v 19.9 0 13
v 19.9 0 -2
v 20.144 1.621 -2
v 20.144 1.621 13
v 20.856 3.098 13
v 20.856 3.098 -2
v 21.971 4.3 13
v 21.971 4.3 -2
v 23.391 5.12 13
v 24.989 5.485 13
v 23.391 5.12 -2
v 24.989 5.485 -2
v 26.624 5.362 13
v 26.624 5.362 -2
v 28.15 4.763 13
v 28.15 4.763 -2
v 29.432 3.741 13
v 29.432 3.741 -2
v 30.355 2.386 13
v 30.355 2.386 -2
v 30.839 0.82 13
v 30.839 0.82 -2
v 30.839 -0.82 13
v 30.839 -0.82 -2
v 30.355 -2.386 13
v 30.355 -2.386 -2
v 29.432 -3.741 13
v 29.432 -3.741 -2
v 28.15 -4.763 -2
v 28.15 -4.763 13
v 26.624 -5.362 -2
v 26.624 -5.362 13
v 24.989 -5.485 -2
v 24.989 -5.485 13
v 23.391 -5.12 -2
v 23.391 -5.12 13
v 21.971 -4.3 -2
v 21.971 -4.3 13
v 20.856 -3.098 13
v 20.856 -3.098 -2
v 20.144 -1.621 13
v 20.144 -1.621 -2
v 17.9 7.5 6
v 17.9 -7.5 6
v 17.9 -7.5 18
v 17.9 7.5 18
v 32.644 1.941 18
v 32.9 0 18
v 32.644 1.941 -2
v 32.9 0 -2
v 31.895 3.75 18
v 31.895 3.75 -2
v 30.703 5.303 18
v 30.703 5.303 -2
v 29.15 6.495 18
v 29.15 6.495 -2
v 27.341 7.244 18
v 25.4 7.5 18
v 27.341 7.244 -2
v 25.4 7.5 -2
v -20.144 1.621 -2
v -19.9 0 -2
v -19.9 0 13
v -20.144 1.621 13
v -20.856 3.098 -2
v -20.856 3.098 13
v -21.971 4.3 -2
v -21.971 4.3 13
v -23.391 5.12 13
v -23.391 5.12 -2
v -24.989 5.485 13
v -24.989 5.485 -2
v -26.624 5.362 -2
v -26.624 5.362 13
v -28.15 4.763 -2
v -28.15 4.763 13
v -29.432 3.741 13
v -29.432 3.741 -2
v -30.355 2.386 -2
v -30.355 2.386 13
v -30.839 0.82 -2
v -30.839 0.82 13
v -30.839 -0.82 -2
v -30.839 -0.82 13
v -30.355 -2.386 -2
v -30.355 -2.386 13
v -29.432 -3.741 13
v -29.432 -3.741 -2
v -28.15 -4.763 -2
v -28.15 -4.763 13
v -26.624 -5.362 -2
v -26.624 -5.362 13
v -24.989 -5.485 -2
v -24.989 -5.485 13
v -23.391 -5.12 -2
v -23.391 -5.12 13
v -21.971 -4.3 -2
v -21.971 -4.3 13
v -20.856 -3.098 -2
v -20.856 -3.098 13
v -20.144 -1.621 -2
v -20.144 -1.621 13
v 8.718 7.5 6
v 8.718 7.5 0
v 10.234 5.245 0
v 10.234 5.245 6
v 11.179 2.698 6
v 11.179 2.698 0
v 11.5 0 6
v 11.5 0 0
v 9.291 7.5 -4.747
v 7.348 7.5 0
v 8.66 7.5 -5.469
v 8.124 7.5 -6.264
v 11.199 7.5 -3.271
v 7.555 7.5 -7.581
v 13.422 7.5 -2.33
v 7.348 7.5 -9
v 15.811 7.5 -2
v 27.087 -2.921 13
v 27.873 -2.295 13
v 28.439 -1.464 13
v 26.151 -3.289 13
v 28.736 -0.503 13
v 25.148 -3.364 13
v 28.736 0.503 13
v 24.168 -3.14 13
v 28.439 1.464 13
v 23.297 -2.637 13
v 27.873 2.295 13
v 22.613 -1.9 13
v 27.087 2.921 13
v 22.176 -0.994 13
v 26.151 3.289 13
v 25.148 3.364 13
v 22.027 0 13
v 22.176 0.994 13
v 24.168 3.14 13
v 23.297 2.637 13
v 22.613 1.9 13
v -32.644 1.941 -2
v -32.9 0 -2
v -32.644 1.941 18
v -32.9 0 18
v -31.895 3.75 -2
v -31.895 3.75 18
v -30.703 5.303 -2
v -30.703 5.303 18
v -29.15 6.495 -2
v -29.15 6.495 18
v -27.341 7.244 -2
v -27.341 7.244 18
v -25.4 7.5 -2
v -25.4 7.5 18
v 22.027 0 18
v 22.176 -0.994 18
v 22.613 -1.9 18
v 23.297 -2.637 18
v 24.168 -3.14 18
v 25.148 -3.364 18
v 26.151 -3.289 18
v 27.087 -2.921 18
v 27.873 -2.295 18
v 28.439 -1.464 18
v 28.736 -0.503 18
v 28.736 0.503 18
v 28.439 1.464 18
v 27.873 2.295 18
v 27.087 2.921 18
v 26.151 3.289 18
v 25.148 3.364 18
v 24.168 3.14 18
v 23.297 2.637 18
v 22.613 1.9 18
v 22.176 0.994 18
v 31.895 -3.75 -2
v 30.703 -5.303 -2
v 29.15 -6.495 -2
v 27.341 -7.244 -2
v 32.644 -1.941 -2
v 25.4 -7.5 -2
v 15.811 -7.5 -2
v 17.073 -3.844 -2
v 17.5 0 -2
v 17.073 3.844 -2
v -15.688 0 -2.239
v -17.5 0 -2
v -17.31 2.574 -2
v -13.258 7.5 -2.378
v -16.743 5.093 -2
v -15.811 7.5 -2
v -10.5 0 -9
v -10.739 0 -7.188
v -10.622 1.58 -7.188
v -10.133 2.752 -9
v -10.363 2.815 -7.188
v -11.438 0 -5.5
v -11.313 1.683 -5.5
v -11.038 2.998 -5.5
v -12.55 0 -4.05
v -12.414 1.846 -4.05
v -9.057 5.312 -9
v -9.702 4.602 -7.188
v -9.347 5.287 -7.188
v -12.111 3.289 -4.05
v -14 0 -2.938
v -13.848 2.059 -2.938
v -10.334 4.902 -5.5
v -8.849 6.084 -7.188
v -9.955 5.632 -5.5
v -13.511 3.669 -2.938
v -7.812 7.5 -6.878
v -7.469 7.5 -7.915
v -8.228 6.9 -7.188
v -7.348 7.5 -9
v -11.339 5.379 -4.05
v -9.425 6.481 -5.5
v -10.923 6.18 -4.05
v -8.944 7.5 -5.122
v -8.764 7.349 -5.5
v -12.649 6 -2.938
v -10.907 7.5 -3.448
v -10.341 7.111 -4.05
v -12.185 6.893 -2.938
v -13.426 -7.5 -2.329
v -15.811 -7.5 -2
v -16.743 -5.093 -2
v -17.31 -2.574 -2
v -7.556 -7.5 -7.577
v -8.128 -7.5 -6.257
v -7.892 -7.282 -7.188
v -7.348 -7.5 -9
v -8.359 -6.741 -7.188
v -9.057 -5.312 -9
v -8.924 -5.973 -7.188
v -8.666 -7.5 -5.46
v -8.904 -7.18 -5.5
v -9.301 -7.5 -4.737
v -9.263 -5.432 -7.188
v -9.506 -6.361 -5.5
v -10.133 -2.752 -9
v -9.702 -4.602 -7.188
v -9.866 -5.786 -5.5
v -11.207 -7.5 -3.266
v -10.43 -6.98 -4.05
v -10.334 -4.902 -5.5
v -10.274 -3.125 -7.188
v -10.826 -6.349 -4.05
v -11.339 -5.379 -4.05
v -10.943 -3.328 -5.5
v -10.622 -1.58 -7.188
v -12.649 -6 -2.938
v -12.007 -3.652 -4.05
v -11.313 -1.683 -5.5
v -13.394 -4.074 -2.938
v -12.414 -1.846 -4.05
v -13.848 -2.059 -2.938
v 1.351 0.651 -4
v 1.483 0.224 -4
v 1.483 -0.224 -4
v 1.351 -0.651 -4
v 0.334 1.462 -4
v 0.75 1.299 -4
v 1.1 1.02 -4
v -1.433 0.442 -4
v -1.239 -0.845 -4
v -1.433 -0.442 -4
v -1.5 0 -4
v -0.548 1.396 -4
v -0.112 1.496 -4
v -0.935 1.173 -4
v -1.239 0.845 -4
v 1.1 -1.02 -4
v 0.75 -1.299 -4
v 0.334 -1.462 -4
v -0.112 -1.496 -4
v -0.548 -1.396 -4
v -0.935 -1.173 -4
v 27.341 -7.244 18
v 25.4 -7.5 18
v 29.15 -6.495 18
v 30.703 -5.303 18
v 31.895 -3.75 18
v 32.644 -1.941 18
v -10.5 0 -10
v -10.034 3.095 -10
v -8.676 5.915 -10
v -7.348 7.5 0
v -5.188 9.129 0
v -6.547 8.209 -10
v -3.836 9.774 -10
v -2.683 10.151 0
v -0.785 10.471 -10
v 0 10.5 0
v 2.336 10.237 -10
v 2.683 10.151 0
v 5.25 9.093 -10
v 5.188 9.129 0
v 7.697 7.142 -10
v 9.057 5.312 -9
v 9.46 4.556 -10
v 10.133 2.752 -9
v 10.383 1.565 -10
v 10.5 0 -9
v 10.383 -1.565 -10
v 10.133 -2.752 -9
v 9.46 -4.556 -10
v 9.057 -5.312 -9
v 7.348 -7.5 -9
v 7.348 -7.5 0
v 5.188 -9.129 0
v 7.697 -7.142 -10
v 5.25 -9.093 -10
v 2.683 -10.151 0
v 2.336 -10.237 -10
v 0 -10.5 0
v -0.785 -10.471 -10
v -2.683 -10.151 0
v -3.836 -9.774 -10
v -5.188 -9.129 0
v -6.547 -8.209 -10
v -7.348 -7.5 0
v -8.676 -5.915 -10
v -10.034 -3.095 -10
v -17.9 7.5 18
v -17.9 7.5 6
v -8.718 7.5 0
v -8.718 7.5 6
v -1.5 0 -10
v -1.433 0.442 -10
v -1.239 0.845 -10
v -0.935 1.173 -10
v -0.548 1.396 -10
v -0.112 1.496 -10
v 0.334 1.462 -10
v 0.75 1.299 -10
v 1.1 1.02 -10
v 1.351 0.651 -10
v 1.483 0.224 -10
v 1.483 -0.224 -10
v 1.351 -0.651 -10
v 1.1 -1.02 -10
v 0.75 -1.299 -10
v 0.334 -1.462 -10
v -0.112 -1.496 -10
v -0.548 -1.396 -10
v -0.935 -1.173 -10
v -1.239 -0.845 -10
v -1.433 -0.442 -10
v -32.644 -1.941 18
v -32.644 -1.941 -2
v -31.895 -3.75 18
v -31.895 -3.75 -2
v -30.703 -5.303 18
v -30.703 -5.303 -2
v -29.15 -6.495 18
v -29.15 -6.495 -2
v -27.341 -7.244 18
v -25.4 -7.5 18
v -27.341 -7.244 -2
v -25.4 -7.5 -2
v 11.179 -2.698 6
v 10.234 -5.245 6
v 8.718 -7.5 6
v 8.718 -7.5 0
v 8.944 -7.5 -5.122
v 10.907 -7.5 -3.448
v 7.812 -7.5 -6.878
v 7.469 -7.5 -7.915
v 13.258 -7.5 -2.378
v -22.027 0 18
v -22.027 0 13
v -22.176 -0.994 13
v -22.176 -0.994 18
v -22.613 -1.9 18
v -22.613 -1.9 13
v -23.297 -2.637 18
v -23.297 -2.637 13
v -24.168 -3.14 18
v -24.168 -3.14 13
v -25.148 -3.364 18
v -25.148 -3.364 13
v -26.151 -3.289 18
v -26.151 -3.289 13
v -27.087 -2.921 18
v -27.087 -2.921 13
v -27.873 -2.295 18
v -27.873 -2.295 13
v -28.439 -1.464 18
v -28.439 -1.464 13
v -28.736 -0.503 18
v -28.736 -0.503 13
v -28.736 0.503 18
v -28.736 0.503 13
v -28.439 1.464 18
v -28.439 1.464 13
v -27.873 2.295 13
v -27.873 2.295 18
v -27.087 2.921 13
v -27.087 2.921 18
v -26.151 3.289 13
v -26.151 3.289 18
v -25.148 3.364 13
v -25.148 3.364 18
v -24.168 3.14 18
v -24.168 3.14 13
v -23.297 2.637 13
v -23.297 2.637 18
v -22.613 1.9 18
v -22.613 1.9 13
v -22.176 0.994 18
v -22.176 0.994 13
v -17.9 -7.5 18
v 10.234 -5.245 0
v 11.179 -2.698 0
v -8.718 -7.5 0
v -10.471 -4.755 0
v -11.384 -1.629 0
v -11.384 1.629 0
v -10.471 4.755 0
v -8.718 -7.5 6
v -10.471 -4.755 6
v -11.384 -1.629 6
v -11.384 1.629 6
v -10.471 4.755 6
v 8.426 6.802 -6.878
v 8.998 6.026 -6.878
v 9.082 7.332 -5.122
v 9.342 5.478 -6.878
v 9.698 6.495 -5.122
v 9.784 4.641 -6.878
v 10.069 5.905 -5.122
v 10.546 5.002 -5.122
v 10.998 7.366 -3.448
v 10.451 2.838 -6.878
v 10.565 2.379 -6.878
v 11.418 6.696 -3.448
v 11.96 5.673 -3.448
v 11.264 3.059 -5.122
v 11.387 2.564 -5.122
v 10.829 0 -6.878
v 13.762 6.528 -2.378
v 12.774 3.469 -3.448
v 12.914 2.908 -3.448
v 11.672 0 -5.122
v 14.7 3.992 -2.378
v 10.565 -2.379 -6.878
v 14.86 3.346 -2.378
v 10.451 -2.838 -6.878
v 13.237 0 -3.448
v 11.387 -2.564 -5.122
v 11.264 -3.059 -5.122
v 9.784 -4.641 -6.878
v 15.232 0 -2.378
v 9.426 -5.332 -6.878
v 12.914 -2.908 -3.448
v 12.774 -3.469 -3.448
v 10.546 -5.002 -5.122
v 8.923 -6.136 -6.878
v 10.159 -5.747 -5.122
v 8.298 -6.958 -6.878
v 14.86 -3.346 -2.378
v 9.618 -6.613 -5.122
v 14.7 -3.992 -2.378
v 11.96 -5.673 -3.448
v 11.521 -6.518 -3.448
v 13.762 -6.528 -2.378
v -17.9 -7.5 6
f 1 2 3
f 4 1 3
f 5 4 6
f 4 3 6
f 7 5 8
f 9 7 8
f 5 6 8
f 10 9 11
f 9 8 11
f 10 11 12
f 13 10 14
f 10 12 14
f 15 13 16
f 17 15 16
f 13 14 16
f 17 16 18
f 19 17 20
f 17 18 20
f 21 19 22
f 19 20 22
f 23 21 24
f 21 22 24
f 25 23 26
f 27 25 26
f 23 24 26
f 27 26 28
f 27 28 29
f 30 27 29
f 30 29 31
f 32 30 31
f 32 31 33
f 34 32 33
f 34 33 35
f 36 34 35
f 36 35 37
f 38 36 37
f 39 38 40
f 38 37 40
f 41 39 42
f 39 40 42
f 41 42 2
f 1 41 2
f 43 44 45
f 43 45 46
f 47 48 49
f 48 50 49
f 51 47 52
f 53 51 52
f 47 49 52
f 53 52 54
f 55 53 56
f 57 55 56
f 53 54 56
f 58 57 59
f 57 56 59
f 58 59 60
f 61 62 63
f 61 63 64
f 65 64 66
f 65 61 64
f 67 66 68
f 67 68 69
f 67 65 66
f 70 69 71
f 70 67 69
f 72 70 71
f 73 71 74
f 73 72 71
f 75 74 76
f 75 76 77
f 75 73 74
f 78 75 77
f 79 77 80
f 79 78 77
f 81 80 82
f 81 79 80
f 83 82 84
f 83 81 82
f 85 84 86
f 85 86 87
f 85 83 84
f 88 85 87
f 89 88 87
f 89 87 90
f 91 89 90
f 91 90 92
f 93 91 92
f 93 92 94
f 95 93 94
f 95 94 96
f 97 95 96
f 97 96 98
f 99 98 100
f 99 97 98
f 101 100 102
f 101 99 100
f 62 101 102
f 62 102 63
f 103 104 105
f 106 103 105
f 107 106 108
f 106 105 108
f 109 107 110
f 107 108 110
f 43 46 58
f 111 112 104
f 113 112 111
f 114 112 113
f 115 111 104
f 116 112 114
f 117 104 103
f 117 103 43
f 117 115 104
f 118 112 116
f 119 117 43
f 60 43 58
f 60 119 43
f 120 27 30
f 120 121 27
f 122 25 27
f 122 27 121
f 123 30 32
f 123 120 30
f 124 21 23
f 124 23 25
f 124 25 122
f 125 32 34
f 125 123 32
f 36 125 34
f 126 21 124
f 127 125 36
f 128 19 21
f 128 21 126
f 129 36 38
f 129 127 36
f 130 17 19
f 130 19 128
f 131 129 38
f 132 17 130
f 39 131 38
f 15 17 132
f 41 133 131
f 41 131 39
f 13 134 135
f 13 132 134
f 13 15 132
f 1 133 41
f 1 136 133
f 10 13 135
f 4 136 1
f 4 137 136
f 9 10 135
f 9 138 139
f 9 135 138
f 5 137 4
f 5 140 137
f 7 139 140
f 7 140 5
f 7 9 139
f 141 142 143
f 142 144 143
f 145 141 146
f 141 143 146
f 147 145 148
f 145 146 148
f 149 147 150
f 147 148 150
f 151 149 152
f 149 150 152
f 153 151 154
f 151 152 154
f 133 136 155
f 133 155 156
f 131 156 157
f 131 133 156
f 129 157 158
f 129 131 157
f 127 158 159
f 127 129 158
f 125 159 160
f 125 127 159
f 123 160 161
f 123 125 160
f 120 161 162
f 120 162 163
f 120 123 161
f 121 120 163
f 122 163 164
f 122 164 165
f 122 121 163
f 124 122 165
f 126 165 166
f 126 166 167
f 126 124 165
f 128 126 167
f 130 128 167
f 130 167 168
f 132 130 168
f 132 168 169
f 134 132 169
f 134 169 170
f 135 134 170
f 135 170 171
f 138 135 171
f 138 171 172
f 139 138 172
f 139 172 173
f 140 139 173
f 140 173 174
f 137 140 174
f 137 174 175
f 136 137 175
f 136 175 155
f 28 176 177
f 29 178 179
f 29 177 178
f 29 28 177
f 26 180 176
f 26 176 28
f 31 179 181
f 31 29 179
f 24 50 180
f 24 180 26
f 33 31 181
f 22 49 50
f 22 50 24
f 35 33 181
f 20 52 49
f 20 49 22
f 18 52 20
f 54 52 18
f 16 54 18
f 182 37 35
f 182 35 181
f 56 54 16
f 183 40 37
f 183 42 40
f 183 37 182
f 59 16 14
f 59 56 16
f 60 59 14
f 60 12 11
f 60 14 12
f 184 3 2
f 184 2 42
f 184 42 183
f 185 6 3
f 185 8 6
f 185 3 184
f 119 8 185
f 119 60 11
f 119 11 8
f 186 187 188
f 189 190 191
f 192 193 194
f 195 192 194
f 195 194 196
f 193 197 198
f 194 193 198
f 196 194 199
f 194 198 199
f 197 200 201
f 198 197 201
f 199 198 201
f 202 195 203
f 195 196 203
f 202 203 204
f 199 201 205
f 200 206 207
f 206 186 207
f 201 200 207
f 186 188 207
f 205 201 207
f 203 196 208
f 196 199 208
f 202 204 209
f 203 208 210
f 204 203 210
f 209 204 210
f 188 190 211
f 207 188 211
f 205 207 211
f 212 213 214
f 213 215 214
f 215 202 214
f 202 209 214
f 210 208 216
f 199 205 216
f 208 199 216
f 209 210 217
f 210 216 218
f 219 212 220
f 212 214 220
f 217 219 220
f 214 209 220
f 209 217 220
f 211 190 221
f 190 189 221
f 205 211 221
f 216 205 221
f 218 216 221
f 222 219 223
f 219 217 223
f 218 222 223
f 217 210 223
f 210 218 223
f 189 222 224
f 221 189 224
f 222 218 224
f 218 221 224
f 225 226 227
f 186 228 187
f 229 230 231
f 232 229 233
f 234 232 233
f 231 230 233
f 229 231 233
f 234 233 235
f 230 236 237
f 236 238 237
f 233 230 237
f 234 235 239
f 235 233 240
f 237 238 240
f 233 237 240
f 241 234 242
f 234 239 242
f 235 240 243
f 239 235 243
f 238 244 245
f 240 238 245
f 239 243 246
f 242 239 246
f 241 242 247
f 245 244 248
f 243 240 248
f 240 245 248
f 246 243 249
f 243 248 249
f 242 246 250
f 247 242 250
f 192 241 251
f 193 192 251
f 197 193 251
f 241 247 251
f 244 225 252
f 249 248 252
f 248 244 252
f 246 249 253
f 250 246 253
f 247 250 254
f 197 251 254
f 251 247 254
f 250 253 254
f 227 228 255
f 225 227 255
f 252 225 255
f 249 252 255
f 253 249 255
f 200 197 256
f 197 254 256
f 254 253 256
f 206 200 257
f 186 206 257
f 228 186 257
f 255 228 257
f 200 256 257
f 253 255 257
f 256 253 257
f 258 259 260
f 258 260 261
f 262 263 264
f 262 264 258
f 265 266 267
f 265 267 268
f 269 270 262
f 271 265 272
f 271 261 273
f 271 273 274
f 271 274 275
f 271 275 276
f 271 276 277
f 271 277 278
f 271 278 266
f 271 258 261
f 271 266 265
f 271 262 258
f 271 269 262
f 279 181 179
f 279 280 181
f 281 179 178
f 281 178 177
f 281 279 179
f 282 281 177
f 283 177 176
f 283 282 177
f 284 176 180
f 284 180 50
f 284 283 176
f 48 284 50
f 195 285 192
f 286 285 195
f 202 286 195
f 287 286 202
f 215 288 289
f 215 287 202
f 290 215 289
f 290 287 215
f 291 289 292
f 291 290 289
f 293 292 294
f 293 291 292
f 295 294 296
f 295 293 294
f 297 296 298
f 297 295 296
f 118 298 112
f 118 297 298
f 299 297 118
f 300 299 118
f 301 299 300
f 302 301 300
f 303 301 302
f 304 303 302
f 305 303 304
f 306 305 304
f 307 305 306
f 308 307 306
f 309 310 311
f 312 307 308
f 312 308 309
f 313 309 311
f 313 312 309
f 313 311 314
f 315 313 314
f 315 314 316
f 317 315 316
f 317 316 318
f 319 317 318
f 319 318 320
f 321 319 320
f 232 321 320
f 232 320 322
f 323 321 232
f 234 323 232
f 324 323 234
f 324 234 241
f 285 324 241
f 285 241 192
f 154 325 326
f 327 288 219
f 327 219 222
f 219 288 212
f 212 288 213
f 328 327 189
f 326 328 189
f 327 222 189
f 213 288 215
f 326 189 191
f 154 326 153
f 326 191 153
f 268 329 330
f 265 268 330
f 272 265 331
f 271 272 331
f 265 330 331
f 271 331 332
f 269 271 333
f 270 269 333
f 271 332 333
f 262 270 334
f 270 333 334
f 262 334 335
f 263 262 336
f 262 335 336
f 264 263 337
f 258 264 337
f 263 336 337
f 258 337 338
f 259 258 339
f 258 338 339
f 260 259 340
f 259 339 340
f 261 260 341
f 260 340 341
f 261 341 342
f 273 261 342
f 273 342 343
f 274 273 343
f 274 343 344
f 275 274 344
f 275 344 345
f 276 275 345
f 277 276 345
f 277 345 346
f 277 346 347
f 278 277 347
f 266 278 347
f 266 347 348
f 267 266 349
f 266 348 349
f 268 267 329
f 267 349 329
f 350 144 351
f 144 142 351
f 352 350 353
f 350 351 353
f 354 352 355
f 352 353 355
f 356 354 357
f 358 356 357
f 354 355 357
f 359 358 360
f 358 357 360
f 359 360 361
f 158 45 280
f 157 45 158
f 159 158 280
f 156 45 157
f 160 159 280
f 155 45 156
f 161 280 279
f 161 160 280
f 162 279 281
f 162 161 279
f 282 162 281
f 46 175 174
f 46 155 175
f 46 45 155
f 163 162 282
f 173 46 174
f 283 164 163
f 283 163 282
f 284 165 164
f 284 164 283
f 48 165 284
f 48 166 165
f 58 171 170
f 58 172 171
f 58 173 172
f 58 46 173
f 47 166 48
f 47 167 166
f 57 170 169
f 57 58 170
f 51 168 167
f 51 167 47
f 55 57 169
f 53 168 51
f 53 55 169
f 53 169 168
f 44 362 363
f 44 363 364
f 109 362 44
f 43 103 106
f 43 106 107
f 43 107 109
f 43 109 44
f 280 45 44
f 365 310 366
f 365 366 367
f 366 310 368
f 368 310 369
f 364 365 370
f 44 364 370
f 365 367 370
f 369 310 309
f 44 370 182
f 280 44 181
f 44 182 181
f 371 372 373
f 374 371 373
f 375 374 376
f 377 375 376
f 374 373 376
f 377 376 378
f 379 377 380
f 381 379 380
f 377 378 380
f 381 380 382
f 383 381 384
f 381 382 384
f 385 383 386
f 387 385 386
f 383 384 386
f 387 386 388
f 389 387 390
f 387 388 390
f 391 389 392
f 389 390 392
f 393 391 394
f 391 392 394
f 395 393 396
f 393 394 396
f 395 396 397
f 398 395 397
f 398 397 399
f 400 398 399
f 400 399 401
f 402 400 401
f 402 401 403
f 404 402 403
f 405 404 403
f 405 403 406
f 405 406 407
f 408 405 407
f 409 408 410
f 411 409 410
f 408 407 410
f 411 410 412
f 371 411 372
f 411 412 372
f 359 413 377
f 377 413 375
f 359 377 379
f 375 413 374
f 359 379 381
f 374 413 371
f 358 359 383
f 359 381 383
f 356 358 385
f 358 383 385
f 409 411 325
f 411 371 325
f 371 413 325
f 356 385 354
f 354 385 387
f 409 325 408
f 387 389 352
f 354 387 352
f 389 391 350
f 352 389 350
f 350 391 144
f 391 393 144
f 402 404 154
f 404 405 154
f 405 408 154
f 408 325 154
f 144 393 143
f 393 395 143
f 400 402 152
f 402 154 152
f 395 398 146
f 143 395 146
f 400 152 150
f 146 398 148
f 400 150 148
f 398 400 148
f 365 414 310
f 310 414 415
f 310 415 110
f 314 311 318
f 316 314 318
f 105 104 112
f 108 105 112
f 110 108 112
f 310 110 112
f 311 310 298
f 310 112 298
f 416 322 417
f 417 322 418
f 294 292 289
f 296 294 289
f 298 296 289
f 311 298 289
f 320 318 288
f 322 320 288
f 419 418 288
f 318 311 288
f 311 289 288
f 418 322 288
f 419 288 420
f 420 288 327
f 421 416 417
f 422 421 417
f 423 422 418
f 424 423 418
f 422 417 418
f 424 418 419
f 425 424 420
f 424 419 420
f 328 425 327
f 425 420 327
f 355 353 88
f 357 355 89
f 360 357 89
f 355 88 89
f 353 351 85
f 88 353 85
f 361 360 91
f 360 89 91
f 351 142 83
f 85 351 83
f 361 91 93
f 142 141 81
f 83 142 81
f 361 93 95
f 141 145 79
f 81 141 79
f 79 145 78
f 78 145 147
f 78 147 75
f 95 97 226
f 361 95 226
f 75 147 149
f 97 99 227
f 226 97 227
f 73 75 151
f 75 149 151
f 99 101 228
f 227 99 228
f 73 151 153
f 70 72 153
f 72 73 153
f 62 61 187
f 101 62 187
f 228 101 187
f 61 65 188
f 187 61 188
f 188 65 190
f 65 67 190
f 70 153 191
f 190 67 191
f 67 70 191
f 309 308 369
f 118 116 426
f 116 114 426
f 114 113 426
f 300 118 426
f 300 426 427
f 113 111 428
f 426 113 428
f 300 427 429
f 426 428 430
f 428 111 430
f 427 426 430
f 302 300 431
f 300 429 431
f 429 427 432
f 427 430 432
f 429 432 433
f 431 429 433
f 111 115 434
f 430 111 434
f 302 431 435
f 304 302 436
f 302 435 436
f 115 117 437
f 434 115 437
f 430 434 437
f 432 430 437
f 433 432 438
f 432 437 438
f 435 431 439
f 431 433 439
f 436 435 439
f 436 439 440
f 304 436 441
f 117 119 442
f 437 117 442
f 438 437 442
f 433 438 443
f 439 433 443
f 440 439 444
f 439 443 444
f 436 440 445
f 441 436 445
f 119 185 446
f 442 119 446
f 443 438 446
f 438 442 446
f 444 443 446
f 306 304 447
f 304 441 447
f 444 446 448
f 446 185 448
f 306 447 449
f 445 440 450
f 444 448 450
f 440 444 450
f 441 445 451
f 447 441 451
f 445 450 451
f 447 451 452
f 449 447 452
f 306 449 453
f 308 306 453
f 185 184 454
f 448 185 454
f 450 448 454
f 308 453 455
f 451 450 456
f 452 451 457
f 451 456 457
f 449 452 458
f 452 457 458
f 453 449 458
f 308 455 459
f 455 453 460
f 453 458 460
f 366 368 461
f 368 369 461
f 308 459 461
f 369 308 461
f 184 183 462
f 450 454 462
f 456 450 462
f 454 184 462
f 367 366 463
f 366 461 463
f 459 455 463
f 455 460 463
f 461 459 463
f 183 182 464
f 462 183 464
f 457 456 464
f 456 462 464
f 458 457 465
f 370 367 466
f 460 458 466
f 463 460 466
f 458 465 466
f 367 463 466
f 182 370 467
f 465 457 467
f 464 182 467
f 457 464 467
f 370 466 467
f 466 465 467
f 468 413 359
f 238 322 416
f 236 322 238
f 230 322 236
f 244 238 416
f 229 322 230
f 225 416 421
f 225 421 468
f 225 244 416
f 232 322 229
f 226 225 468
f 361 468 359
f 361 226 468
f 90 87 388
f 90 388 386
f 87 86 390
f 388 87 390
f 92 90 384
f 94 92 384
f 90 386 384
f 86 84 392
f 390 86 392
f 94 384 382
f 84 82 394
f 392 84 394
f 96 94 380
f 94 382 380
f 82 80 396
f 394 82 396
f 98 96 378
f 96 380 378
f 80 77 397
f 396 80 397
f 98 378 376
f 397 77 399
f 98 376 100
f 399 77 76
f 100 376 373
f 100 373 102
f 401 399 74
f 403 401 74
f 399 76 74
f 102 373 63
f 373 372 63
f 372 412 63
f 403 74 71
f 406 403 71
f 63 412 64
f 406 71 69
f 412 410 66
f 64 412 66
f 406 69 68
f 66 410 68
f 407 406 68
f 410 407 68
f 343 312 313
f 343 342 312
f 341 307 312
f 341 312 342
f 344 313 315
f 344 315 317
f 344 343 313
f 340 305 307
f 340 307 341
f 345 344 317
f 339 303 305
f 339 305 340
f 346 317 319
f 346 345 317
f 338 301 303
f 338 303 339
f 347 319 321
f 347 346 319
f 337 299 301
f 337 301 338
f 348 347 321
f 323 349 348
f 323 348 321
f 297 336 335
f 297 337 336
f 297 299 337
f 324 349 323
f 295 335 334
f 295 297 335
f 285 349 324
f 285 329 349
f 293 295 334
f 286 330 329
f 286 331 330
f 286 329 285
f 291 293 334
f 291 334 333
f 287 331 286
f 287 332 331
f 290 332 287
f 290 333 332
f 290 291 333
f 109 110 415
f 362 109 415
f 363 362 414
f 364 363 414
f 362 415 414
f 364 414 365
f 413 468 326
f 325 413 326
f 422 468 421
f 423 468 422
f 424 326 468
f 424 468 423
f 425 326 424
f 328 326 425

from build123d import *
from build123d.topology import SkipClean

# Parameters (mm, degrees)
SKETCH1_R             = 3.3734375
BOSS_EXTRUDE1_DEPTH   = 6
BOSS_EXTRUDE1_2_DEPTH = 6
BOSS_EXTRUDE2_START   = 2
SKETCH2_R             = 3.3734375
BOSS_EXTRUDE2_DEPTH   = 2
SKETCH3_R             = 10.5
BOSS_EXTRUDE3_DEPTH   = 2
BOSS_EXTRUDE4_START   = 2
SKETCH4_R             = 10.5
BOSS_EXTRUDE4_DEPTH   = 2
BOSS_EXTRUDE5_START   = 6
SKETCH5_R             = 10.5
SKETCH5_R_2           = 1.5
BOSS_EXTRUDE5_DEPTH   = 6
FILLET1_R             = 7
SKETCH6_W             = 15
SKETCH6_H             = 15
SKETCH6_R             = 3.3734375
BOSS_EXTRUDE6_DEPTH   = 12
SKETCH7_R             = 5.5
CUT_EXTRUDE2_DEPTH    = 15
SKETCH8_W             = 8
SKETCH8_H             = 15
CUT_EXTRUDE3_DEPTH    = 5.2
SKETCH9_W             = 8
SKETCH9_H             = 15
CUT_EXTRUDE4_DEPTH    = 5.2
FILLET2_R             = 7.5


# Some blends are built 0.0001 mm under size
with BuildPart() as part:
    # Sketch1 → Boss-Extrude1 (new body)
    with BuildSketch(Plane.XY):
        with BuildLine():
            ThreePointArc((11.5, 0), (10.782037741, -3.999707758), (8.717797887, -7.5))
            Line((8.717797887, -7.5), (38.1, -7.5))
            Line((38.1, -7.5), (38.1, 7.5))
            Line((38.1, 7.5), (8.717797887, 7.5))
            ThreePointArc((8.717797887, 7.5), (10.782037741, 3.999707758), (11.5, 0))
        make_face()
        with Locations((25.4, 0)):
            Circle(SKETCH1_R, mode=Mode.SUBTRACT)
    extrude(amount=BOSS_EXTRUDE1_DEPTH)



with BuildPart() as body_2:
    # Sketch1 → Boss-Extrude1 2 (new body)
    with BuildSketch(Plane.XY):
        with BuildLine():
            Line((-38.1, 7.5), (-38.1, -7.5))
            Line((-38.1, -7.5), (-8.717797887, -7.5))
            ThreePointArc((-8.717797887, -7.5), (-11.5, 0), (-8.717797887, 7.5))
            Line((-8.717797887, 7.5), (-38.1, 7.5))
        make_face()
        with Locations((-25.4, 0)):
            Circle(SKETCH1_R, mode=Mode.SUBTRACT)
    extrude(amount=BOSS_EXTRUDE1_2_DEPTH)


with BuildPart() as part_1:
    with SkipClean():  # the faces are left unmerged after this step: merging them gives an invalid solid
        add(part.part)

        add(body_2.part)  # Boss-Extrude2 merges body 2
        # Sketch2 → Boss-Extrude2 (add)
        # profile 1 of 3: a face of its own
        with BuildSketch(Plane(origin=(0, 0, 0), x_dir=(-1, 0, 0), z_dir=(0, 0, -1)).offset(BOSS_EXTRUDE2_START)):
            with BuildLine():
                Line((-38.1, -7.5), (-8.717797887, -7.5))
                ThreePointArc((-8.717797887, -7.5), (-11.5, 0), (-8.717797887, 7.5))
                Line((-8.717797887, 7.5), (-38.1, 7.5))
                Line((-38.1, 7.5), (-38.1, -7.5))
            make_face()
            with Locations((-25.4, 0)):
                Circle(SKETCH2_R, mode=Mode.SUBTRACT)
        # profile 2 of 3: a face of its own
        with BuildSketch(Plane(origin=(0, 0, 0), x_dir=(-1, 0, 0), z_dir=(0, 0, -1)).offset(BOSS_EXTRUDE2_START)):
            with BuildLine():
                Line((-8.717797887, -7.5), (8.717797887, -7.5))
                ThreePointArc((8.717797887, -7.5), (11.5, 0), (8.717797887, 7.5))
                Line((8.717797887, 7.5), (-8.717797887, 7.5))
                ThreePointArc((-8.717797887, 7.5), (-11.5, 0), (-8.717797887, -7.5))
            make_face()
        # profile 3 of 3: a face of its own
        with BuildSketch(Plane(origin=(0, 0, 0), x_dir=(-1, 0, 0), z_dir=(0, 0, -1)).offset(BOSS_EXTRUDE2_START)):
            with BuildLine():
                ThreePointArc((8.717797887, -7.5), (11.5, 0), (8.717797887, 7.5))
                Line((8.717797887, 7.5), (38.1, 7.5))
                Line((38.1, 7.5), (38.1, -7.5))
                Line((38.1, -7.5), (8.717797887, -7.5))
            make_face()
            with Locations(Location((25.4, 0, 0), (0, 0, 180))):
                Circle(SKETCH2_R, mode=Mode.SUBTRACT)
        extrude(amount=-BOSS_EXTRUDE2_DEPTH)

    # Sketch3 → Boss-Extrude3 (add)
    with SkipClean():  # the faces are left unmerged after this step: merging them gives an invalid solid
        with BuildSketch(Plane(origin=(0, 0, -2), x_dir=(-1, 0, 0), z_dir=(0, 0, -1))):
            Circle(SKETCH3_R)
        extrude(amount=-BOSS_EXTRUDE3_DEPTH)

    # Sketch4 → Boss-Extrude4 (add)
    with SkipClean():  # the faces are left unmerged after this step: merging them gives an invalid solid
        with BuildSketch(Plane(origin=(0, 0, -2), x_dir=(-1, 0, 0), z_dir=(0, 0, -1)).offset(BOSS_EXTRUDE4_START)):
            Circle(SKETCH4_R)
        extrude(amount=-BOSS_EXTRUDE4_DEPTH)

    # Sketch5 → Boss-Extrude5 (add)
    with SkipClean():  # the faces are left unmerged after this step: merging them gives an invalid solid
        with BuildSketch(Plane(origin=(0, 0, -4), x_dir=(-1, 0, 0), z_dir=(0, 0, -1)).offset(BOSS_EXTRUDE5_START)):
            Circle(SKETCH5_R)
            Circle(SKETCH5_R_2, mode=Mode.SUBTRACT)
        extrude(amount=-BOSS_EXTRUDE5_DEPTH)

    # Fillet1
    # the kernel refuses this fillet: 7 mm, written as the material it adds along each edge
    with BuildSketch(Plane(origin=(0, 0, -2), x_dir=(-1, 0, 0), z_dir=(0, -1, 0))) as fillet1_piece_1_section:
        with BuildLine():
            CenterArc((10.5 + FILLET1_R, FILLET1_R), FILLET1_R, 180, 90)
            Line((10.5 + FILLET1_R, 0), (10.5, 0))
            Line((10.5, 0), (10.5, FILLET1_R))
        make_face()
    fillet1_piece_1 = revolve(axis=Axis((0, 0, -2), (0, 0, -1)), revolution_arc=141.087496106, mode=Mode.PRIVATE)
    fillet1_piece_1 = split(fillet1_piece_1, bisect_by=Plane(origin=(-11.14561096, 7.5, -3.604307229), z_dir=(0, -1, 0)), keep=Keep.TOP, mode=Mode.PRIVATE)
    add(fillet1_piece_1)
    with BuildSketch(Plane(origin=(0, 0, -2), x_dir=(-0.7784296665775441, 0.627731833024241, 0), z_dir=(-0.627731833024241, -0.7784296665775441, 0))) as fillet1_piece_2_section:
        with BuildLine():
            CenterArc((10.5 + FILLET1_R, FILLET1_R), FILLET1_R, 180, 90)
            Line((10.5, FILLET1_R), (10.5, 0))
            Line((10.5, 0), (10.5 + FILLET1_R, 0))
        make_face()
    fillet1_piece_2 = revolve(axis=Axis((0, 0, -2), (0, 0, -1)), revolution_arc=282.234042337, mode=Mode.PRIVATE)
    fillet1_piece_2 = split(fillet1_piece_2, bisect_by=Plane(origin=(-8.090689078, 7.5, -4.608700721), z_dir=(0, -1, 0)), keep=Keep.TOP, mode=Mode.PRIVATE)
    fillet1_piece_2 = split(fillet1_piece_2, bisect_by=Plane(origin=(-8.090689078, -7.5, -4.608700721), z_dir=(0, 1, 0)), keep=Keep.TOP, mode=Mode.PRIVATE)
    add(fillet1_piece_2)
    with BuildSketch(Plane(origin=(0, 0, -2), x_dir=(0.7781060870335762, -0.6281328818978487, 0), z_dir=(0.6281328818978487, 0.7781060870335762, 0))) as fillet1_piece_3_section:
        with BuildLine():
            CenterArc((10.5 + FILLET1_R, FILLET1_R), FILLET1_R, 180, 90)
            Line((10.5 + FILLET1_R, 0), (10.5, 0))
            Line((10.5, 0), (10.5, FILLET1_R))
        make_face()
    fillet1_piece_3 = revolve(axis=Axis((0, 0, -2), (0, 0, -1)), revolution_arc=141.087496106, mode=Mode.PRIVATE)
    fillet1_piece_3 = split(fillet1_piece_3, bisect_by=Plane(origin=(8.086917583, -7.5, -4.611323589), z_dir=(0, 1, 0)), keep=Keep.TOP, mode=Mode.PRIVATE)
    add(fillet1_piece_3)

    # Sketch6 → Boss-Extrude6 (add)
    with BuildSketch(Plane.XY.offset(6)):
        with Locations((25.4, 0)):
            Rectangle(SKETCH6_W, SKETCH6_H)
        with Locations(Location((25.4, 0, 0), (0, 0, 180))):
            Circle(SKETCH6_R, mode=Mode.SUBTRACT)
    boss_extrude6 = extrude(amount=BOSS_EXTRUDE6_DEPTH)

    # Sketch7 → Cut-Extrude2 (cut)
    with BuildSketch(Plane(origin=(0, 0, -2), x_dir=(-1, 0, 0), z_dir=(0, 0, -1))):
        with Locations((-25.4, 0)):
            Circle(SKETCH7_R)
    cut_extrude2 = extrude(amount=-CUT_EXTRUDE2_DEPTH, mode=Mode.SUBTRACT)

    # Sketch8 → Cut-Extrude3 (cut)
    with BuildSketch(Plane(origin=(38.1, 0, 0), x_dir=(0, 0, -1), z_dir=(1, 0, 0))):
        with Locations((-2, 0)):
            Rectangle(SKETCH8_W, SKETCH8_H)
    extrude(amount=-CUT_EXTRUDE3_DEPTH, mode=Mode.SUBTRACT)

    # Mirror1: Boss-Extrude6, Cut-Extrude2 across plane
    add(boss_extrude6.mirror(Plane(origin=(0, 0, 0), x_dir=(0, 0, 1), z_dir=(1, 0, 0))))
    add(cut_extrude2.mirror(Plane(origin=(0, 0, 0), x_dir=(0, 0, 1), z_dir=(1, 0, 0))), mode=Mode.SUBTRACT)

    # Sketch9 → Cut-Extrude4 (cut)
    with BuildSketch(Plane.ZY.offset(38.1)):
        with Locations((2, 0)):
            Rectangle(SKETCH9_W, SKETCH9_H)
    extrude(amount=-CUT_EXTRUDE4_DEPTH, mode=Mode.SUBTRACT)

    # Fillet2
    fillet2_edges = [part_1.edges().sort_by_distance(p)[0] for p in [
        (32.9, -7.5, 8),
        (32.9, 7.5, 8),
        (-32.9, 7.5, 8),
        (-32.9, -7.5, 8),
    ]]
    fillet(fillet2_edges, radius=FILLET2_R - 0.0001)  # a hair under: the kernel refuses the full size


solid = part_1.part
